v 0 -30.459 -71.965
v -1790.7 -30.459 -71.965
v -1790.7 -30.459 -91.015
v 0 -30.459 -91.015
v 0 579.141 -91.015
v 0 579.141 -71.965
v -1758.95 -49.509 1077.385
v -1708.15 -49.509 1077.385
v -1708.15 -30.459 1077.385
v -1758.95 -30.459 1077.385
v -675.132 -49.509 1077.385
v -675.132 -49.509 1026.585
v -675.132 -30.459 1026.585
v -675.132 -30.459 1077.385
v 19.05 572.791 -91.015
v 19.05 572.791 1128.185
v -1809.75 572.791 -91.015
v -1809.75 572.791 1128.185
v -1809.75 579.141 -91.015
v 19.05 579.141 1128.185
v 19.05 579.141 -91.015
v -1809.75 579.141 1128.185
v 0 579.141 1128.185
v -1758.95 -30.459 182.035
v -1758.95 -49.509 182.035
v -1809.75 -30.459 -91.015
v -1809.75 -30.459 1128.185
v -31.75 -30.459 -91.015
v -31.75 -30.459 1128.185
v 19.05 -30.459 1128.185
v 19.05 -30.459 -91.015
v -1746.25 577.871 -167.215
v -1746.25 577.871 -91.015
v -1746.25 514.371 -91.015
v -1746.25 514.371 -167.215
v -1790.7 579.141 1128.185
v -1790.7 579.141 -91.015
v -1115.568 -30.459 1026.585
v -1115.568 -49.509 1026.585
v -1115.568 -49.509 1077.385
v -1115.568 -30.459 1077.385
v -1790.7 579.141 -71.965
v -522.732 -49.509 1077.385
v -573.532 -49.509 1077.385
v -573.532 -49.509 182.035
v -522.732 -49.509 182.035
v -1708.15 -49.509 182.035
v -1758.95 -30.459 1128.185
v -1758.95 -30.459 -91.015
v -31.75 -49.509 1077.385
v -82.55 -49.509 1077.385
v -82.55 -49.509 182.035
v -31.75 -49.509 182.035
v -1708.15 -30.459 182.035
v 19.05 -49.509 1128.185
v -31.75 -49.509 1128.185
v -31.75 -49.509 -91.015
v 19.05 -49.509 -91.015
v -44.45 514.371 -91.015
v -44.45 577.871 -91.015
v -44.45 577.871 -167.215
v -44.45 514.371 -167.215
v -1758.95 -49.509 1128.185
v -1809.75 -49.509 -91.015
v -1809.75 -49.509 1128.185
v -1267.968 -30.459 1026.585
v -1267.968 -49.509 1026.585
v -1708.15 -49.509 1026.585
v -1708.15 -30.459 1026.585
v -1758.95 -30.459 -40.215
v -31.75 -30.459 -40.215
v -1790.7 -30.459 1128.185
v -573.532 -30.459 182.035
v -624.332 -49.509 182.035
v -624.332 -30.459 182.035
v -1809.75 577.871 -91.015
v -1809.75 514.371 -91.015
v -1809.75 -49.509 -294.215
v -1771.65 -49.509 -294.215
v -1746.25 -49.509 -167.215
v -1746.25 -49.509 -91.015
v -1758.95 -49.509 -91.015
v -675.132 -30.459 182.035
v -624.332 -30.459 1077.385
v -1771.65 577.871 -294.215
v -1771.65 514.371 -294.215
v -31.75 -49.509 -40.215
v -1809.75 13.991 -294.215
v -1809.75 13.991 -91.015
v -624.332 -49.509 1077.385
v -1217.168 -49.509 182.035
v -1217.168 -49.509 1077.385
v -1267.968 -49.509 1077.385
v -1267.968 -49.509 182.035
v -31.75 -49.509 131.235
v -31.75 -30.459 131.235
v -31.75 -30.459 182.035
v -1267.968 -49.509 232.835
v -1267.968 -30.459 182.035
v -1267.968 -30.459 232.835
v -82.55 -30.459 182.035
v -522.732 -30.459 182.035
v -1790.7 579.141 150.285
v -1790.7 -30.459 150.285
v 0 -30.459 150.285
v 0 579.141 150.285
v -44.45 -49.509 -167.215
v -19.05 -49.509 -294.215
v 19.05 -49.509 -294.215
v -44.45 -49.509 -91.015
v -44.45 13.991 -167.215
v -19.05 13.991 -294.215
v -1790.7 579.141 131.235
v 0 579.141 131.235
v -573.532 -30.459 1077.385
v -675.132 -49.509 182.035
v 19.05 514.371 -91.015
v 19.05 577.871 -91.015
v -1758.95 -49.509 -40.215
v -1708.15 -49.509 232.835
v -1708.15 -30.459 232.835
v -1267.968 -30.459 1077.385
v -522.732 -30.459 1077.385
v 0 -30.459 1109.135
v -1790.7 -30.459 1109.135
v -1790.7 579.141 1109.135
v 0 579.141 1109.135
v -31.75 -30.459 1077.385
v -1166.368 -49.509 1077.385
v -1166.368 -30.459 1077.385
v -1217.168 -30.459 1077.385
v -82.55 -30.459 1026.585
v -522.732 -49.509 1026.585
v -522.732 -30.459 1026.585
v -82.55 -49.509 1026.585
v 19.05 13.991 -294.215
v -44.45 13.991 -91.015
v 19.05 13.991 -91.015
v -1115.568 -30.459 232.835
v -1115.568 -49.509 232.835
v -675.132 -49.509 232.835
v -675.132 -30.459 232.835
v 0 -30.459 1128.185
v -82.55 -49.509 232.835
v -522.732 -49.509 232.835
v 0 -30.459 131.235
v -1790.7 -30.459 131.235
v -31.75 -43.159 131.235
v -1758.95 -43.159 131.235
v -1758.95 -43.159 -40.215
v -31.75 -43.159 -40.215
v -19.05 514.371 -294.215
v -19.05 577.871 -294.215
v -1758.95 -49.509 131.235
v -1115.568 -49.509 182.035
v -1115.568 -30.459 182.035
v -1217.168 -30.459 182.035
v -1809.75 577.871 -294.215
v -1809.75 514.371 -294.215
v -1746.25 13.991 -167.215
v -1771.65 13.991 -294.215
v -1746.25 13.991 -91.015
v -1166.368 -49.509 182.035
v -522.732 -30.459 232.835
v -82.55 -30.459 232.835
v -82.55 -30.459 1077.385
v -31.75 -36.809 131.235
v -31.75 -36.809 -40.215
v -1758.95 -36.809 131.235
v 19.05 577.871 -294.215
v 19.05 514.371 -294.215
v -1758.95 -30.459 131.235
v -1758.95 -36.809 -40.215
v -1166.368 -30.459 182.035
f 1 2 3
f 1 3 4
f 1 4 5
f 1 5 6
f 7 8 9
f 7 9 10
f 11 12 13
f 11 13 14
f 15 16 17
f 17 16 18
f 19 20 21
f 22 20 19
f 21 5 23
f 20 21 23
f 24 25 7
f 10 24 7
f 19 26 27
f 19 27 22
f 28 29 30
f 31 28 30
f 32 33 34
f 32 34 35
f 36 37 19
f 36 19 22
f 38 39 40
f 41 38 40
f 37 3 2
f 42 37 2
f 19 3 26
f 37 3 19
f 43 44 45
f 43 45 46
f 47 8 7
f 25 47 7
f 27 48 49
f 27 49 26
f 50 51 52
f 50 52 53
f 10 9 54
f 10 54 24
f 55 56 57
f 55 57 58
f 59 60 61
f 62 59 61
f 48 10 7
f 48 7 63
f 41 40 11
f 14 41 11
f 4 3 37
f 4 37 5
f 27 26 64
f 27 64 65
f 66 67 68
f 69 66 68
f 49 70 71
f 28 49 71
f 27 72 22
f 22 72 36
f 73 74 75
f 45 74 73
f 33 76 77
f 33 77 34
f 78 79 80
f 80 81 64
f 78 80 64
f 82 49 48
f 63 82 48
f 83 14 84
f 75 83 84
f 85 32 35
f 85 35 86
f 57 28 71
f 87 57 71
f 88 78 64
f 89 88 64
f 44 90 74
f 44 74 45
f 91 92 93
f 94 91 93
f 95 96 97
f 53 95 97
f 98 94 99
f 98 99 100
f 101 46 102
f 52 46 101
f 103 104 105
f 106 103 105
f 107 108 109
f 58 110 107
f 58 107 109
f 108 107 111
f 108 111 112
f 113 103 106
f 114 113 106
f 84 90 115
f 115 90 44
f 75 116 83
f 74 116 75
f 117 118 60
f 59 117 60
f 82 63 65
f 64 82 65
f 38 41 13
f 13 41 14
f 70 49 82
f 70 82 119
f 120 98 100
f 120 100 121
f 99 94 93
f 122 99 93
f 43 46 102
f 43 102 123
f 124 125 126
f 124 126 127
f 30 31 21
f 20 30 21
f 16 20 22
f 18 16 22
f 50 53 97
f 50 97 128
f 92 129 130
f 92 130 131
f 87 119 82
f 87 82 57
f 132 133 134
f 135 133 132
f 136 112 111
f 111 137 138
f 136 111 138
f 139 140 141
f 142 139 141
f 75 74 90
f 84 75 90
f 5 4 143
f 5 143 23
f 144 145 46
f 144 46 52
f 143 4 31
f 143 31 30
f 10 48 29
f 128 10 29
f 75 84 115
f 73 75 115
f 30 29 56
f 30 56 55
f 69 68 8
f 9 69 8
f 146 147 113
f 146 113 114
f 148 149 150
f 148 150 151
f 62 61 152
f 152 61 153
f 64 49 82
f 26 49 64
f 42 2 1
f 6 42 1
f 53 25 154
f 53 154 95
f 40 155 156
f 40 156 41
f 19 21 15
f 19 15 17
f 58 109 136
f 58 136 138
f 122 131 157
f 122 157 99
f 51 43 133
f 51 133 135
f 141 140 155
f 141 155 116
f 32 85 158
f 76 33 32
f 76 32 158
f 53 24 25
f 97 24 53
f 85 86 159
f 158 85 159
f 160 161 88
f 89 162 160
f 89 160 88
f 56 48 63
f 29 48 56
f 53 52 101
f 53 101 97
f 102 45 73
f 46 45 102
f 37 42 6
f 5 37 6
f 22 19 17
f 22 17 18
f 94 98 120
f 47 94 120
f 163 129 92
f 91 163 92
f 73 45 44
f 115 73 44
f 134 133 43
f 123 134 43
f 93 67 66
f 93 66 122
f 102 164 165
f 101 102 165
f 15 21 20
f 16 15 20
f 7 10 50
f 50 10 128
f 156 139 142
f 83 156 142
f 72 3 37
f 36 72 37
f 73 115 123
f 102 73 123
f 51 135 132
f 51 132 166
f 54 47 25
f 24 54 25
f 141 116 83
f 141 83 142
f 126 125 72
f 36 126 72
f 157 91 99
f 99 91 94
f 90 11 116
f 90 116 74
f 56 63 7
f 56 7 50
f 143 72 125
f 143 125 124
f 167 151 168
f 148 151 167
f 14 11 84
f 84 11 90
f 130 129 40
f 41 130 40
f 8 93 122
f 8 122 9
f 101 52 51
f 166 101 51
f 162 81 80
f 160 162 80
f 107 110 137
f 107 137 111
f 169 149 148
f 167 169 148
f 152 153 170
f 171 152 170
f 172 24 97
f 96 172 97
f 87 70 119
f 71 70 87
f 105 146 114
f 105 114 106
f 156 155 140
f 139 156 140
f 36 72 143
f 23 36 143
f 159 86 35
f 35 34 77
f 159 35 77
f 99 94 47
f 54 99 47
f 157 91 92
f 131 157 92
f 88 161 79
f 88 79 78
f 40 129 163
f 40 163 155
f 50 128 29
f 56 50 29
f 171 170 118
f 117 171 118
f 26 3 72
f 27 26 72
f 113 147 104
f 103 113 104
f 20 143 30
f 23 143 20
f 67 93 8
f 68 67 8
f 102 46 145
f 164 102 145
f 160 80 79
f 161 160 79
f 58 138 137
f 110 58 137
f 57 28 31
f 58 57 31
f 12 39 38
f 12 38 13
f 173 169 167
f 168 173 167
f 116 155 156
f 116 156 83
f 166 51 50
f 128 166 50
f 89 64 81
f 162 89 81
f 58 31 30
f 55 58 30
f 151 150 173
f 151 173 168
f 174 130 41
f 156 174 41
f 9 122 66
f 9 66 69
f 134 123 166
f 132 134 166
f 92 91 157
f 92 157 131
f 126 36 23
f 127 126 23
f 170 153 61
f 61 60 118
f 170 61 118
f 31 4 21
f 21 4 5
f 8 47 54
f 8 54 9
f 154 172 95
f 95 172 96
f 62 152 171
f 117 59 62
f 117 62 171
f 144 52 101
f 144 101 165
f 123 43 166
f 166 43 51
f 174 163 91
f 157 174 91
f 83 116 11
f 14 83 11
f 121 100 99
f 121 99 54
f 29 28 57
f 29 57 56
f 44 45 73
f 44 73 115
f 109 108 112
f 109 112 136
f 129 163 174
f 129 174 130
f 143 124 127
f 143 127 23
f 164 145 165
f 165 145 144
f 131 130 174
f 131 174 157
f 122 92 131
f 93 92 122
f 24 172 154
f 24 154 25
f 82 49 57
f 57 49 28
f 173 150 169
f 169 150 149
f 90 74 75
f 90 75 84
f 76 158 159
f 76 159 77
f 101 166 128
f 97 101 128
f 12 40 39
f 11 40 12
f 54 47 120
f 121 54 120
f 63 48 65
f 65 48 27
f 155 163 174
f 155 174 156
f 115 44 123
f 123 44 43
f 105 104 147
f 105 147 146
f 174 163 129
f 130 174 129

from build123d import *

# Parameters (mm, degrees)
F0_W      = 609.6
F0_H      = 1219.2
F1_DEPTH  = 19.05
F4_W      = 1790.7
F4_H      = 19.05
F5_DEPTH  = 609.6
F6_W      = 1790.7
F6_H      = 19.05
F7_DEPTH  = 609.6
F8_W      = 1790.7
F8_H      = 19.05
F9_DEPTH  = 609.6
F10_W     = 50.8
F10_H     = 1219.2
F11_DEPTH = 19.05
F13_W     = 1727.2
F13_H     = 50.8
F14_DEPTH = 19.05
F15_W     = 1727.2
F15_H     = 50.8
F16_DEPTH = 19.05
F17_W     = 1727.2
F17_H     = 50.8
F18_DEPTH = 19.05
F21_W     = 50.8
F21_H     = 895.35
F22_DEPTH = 19.05
F20_W     = 1727.2
F20_H     = 171.45
F24_DEPTH = 6.35
F25_W     = 50.8
F25_H     = 895.35
F26_DEPTH = 19.05
F27_W     = 50.8
F27_H     = 895.35
F28_DEPTH = 19.05
F29_W     = 440.182
F29_H     = 50.8
F30_DEPTH = 19.05
F31_W     = 440.182
F31_H     = 50.8
F32_DEPTH = 19.05
F34_W     = 50.8
F34_H     = 895.35
F35_DEPTH = 19.05
F36_W     = 50.8
F36_H     = 895.35
F37_DEPTH = 19.05
F38_W     = 440.436
F38_H     = 50.8
F39_DEPTH = 19.05
F40_W     = 440.436
F40_H     = 50.8
F41_DEPTH = 19.05
F42_W     = 1828.8
F42_H     = 1219.2
F43_DEPTH = 6.35
F45_DEPTH = 63.5


with BuildPart() as f1:
    # F0 (on Right) → F1 (new body)
    with BuildSketch(Plane.YZ):
        with Locations((274.3411302805, 518.5848358816)):
            Rectangle(F0_W, F0_H)
    extrude(amount=F1_DEPTH)


with BuildPart() as f3_1:
    # F3: instance of F1
    add(f1.part.mirror(Plane(origin=(-895.35, 274.3411302805, 518.5848358816), x_dir=(0, 1, 0), z_dir=(1, 0, 0))))


with BuildPart() as f5:
    # F4 (on face) → F5 (new body)
    with BuildSketch(Plane.XZ.offset(30.4588697195)):
        with Locations((-895.35, 1118.6598358816)):
            Rectangle(F4_W, F4_H)
    extrude(amount=-F5_DEPTH)


with BuildPart() as f7:
    # F6 (on face) → F7 (new body)
    with BuildSketch(Plane.XZ.offset(30.4588697195)):
        with Locations((-895.35, -81.4901641184)):
            Rectangle(F6_W, F6_H)
    extrude(amount=-F7_DEPTH)


with BuildPart() as f9:
    # F8 (on face) → F9 (new body)
    with BuildSketch(Plane.XZ.offset(30.4588697195)):
        with Locations((-895.35, 140.7598358816)):
            Rectangle(F8_W, F8_H)
    extrude(amount=-F9_DEPTH)


with BuildPart() as f11:
    # F10 (on face) → F11 (new body)
    with BuildSketch(Plane.XZ.offset(30.4588697195)):
        with Locations((-6.35, 518.5848358816)):
            Rectangle(F10_W, F10_H)
    extrude(amount=F11_DEPTH)


with BuildPart() as f12_1:
    # F12: instance of F11
    add(f11.part.mirror(Plane(origin=(-895.35, 274.3411302805, 518.5848358816), x_dir=(0, 1, 0), z_dir=(1, 0, 0))))


with BuildPart() as f14:
    # F13 (on face) → F14 (new body)
    with BuildSketch(Plane.XZ.offset(30.4588697195)):
        with Locations((-895.35, 1102.7848358816)):
            Rectangle(F13_W, F13_H)
    extrude(amount=F14_DEPTH)


with BuildPart() as f16:
    # F15 (on face) → F16 (new body)
    with BuildSketch(Plane.XZ.offset(30.4588697195)):
        with Locations((-895.35, 156.6348358816)):
            Rectangle(F15_W, F15_H)
    extrude(amount=F16_DEPTH)


with BuildPart() as f18:
    # F17 (on face) → F18 (new body)
    with BuildSketch(Plane.XZ.offset(30.4588697195)):
        with Locations((-895.35, -65.6151641184)):
            Rectangle(F17_W, F17_H)
    extrude(amount=F18_DEPTH)


with BuildPart() as f22:
    # F21 (on face) → F22 (new body)
    with BuildSketch(Plane.XZ.offset(49.5088697195)):
        with Locations((-598.932, 629.7098358816)):
            Rectangle(F21_W, F21_H)
    extrude(amount=-F22_DEPTH)


with BuildPart() as f23_1:
    # F23: instance of F22
    add(f22.part.mirror(Plane(origin=(-895.35, 274.3411302805, 518.5848358816), x_dir=(0, 1, 0), z_dir=(1, 0, 0))))


with BuildPart() as f24:
    # F20 (on offset) → F24 (new body)
    with BuildSketch(Plane.XZ.offset(43.1588697195)):
        with Locations((-895.35, 45.5098358816)):
            Rectangle(F20_W, F20_H)
    extrude(amount=-F24_DEPTH)


with BuildPart() as f26:
    # F25 (on face) → F26 (new body)
    with BuildSketch(Plane.XZ.offset(49.5088697195)):
        with Locations((-57.15, 629.7098358816)):
            Rectangle(F25_W, F25_H)
    extrude(amount=-F26_DEPTH)


with BuildPart() as f28:
    # F27 (on face) → F28 (new body)
    with BuildSketch(Plane.XZ.offset(49.5088697195)):
        with Locations((-548.132, 629.7098358816)):
            Rectangle(F27_W, F27_H)
    extrude(amount=-F28_DEPTH)


with BuildPart() as f30:
    # F29 (on face) → F30 (new body)
    with BuildSketch(Plane.XZ.offset(49.5088697195)):
        with Locations((-302.641, 1051.9848358816)):
            Rectangle(F29_W, F29_H)
    extrude(amount=-F30_DEPTH)


with BuildPart() as f32:
    # F31 (on face) → F32 (new body)
    with BuildSketch(Plane.XZ.offset(49.5088697195)):
        with Locations((-302.641, 207.4348358816)):
            Rectangle(F31_W, F31_H)
    extrude(amount=-F32_DEPTH)


with BuildPart() as f33_1:
    # F33: instance of F28
    add(f28.part.mirror(Plane(origin=(-895.35, 274.3411302805, 518.5848358816), x_dir=(0, 1, 0), z_dir=(1, 0, 0))))


with BuildPart() as f33_2:
    # F33: instance of F30
    add(f30.part.mirror(Plane(origin=(-895.35, 274.3411302805, 518.5848358816), x_dir=(0, 1, 0), z_dir=(1, 0, 0))))


with BuildPart() as f33_3:
    # F33: instance of F26
    add(f26.part.mirror(Plane(origin=(-895.35, 274.3411302805, 518.5848358816), x_dir=(0, 1, 0), z_dir=(1, 0, 0))))


with BuildPart() as f33_4:
    # F33: instance of F32
    add(f32.part.mirror(Plane(origin=(-895.35, 274.3411302805, 518.5848358816), x_dir=(0, 1, 0), z_dir=(1, 0, 0))))


with BuildPart() as f35:
    # F34 (on face) → F35 (new body)
    with BuildSketch(Plane.XZ.offset(49.5088697195)):
        with Locations((-649.732, 629.7098358816)):
            Rectangle(F34_W, F34_H)
    extrude(amount=-F35_DEPTH)


with BuildPart() as f37:
    # F36 (on face) → F37 (new body)
    with BuildSketch(Plane.XZ.offset(49.5088697195)):
        with Locations((-1140.968, 629.7098358816)):
            Rectangle(F36_W, F36_H)
    extrude(amount=-F37_DEPTH)


with BuildPart() as f39:
    # F38 (on face) → F39 (new body)
    with BuildSketch(Plane.XZ.offset(49.5088697195)):
        with Locations((-895.35, 1051.9848358816)):
            Rectangle(F38_W, F38_H)
    extrude(amount=-F39_DEPTH)


with BuildPart() as f41:
    # F40 (on face) → F41 (new body)
    with BuildSketch(Plane.XZ.offset(49.5088697195)):
        with Locations((-895.35, 207.4348358816)):
            Rectangle(F40_W, F40_H)
    extrude(amount=-F41_DEPTH)


with BuildPart() as f43:
    # F42 (on face) → F43 (new body)
    with BuildSketch(Plane(origin=(0, 579.1411302805, 0), x_dir=(-1, 0, 0), z_dir=(0, 1, 0))):
        with Locations((895.35, 518.5848358816)):
            Rectangle(F42_W, F42_H)
    extrude(amount=-F43_DEPTH)


with BuildPart() as f45:
    # F44 (on face) → F45 (new body)
    with BuildSketch(Plane.XZ.offset(49.5088697195)):
        Polygon((19.05, -294.2151641184), (19.05, -91.0151641184), (-44.45, -91.0151641184), (-44.45, -167.2151641184), (-19.05, -294.2151641184), align=None)
    extrude(amount=-F45_DEPTH)


with BuildPart() as f46_1:
    # F46: instance of F45
    add(f45.part.mirror(Plane(origin=(-895.35, 274.3411302805, 518.5848358816), x_dir=(0, 1, 0), z_dir=(1, 0, 0))))


with BuildPart() as f48_1:
    # F48: instance of F46_1
    add(f46_1.part.mirror(Plane(origin=(-895.35, 264.1811302805, 1118.6598358816), x_dir=(1, 0, 0), z_dir=(0, 1, 0))))


with BuildPart() as f48_2:
    # F48: instance of F45
    add(f45.part.mirror(Plane(origin=(-895.35, 264.1811302805, 1118.6598358816), x_dir=(1, 0, 0), z_dir=(0, 1, 0))))


solid = Compound([f1.part, f3_1.part, f5.part, f7.part, f9.part, f11.part, f12_1.part, f14.part, f16.part, f18.part, f22.part, f23_1.part, f24.part, f26.part, f28.part, f30.part, f32.part, f33_1.part, f33_2.part, f33_3.part, f33_4.part, f35.part, f37.part, f39.part, f41.part, f43.part, f45.part, f46_1.part, f48_1.part, f48_2.part])
